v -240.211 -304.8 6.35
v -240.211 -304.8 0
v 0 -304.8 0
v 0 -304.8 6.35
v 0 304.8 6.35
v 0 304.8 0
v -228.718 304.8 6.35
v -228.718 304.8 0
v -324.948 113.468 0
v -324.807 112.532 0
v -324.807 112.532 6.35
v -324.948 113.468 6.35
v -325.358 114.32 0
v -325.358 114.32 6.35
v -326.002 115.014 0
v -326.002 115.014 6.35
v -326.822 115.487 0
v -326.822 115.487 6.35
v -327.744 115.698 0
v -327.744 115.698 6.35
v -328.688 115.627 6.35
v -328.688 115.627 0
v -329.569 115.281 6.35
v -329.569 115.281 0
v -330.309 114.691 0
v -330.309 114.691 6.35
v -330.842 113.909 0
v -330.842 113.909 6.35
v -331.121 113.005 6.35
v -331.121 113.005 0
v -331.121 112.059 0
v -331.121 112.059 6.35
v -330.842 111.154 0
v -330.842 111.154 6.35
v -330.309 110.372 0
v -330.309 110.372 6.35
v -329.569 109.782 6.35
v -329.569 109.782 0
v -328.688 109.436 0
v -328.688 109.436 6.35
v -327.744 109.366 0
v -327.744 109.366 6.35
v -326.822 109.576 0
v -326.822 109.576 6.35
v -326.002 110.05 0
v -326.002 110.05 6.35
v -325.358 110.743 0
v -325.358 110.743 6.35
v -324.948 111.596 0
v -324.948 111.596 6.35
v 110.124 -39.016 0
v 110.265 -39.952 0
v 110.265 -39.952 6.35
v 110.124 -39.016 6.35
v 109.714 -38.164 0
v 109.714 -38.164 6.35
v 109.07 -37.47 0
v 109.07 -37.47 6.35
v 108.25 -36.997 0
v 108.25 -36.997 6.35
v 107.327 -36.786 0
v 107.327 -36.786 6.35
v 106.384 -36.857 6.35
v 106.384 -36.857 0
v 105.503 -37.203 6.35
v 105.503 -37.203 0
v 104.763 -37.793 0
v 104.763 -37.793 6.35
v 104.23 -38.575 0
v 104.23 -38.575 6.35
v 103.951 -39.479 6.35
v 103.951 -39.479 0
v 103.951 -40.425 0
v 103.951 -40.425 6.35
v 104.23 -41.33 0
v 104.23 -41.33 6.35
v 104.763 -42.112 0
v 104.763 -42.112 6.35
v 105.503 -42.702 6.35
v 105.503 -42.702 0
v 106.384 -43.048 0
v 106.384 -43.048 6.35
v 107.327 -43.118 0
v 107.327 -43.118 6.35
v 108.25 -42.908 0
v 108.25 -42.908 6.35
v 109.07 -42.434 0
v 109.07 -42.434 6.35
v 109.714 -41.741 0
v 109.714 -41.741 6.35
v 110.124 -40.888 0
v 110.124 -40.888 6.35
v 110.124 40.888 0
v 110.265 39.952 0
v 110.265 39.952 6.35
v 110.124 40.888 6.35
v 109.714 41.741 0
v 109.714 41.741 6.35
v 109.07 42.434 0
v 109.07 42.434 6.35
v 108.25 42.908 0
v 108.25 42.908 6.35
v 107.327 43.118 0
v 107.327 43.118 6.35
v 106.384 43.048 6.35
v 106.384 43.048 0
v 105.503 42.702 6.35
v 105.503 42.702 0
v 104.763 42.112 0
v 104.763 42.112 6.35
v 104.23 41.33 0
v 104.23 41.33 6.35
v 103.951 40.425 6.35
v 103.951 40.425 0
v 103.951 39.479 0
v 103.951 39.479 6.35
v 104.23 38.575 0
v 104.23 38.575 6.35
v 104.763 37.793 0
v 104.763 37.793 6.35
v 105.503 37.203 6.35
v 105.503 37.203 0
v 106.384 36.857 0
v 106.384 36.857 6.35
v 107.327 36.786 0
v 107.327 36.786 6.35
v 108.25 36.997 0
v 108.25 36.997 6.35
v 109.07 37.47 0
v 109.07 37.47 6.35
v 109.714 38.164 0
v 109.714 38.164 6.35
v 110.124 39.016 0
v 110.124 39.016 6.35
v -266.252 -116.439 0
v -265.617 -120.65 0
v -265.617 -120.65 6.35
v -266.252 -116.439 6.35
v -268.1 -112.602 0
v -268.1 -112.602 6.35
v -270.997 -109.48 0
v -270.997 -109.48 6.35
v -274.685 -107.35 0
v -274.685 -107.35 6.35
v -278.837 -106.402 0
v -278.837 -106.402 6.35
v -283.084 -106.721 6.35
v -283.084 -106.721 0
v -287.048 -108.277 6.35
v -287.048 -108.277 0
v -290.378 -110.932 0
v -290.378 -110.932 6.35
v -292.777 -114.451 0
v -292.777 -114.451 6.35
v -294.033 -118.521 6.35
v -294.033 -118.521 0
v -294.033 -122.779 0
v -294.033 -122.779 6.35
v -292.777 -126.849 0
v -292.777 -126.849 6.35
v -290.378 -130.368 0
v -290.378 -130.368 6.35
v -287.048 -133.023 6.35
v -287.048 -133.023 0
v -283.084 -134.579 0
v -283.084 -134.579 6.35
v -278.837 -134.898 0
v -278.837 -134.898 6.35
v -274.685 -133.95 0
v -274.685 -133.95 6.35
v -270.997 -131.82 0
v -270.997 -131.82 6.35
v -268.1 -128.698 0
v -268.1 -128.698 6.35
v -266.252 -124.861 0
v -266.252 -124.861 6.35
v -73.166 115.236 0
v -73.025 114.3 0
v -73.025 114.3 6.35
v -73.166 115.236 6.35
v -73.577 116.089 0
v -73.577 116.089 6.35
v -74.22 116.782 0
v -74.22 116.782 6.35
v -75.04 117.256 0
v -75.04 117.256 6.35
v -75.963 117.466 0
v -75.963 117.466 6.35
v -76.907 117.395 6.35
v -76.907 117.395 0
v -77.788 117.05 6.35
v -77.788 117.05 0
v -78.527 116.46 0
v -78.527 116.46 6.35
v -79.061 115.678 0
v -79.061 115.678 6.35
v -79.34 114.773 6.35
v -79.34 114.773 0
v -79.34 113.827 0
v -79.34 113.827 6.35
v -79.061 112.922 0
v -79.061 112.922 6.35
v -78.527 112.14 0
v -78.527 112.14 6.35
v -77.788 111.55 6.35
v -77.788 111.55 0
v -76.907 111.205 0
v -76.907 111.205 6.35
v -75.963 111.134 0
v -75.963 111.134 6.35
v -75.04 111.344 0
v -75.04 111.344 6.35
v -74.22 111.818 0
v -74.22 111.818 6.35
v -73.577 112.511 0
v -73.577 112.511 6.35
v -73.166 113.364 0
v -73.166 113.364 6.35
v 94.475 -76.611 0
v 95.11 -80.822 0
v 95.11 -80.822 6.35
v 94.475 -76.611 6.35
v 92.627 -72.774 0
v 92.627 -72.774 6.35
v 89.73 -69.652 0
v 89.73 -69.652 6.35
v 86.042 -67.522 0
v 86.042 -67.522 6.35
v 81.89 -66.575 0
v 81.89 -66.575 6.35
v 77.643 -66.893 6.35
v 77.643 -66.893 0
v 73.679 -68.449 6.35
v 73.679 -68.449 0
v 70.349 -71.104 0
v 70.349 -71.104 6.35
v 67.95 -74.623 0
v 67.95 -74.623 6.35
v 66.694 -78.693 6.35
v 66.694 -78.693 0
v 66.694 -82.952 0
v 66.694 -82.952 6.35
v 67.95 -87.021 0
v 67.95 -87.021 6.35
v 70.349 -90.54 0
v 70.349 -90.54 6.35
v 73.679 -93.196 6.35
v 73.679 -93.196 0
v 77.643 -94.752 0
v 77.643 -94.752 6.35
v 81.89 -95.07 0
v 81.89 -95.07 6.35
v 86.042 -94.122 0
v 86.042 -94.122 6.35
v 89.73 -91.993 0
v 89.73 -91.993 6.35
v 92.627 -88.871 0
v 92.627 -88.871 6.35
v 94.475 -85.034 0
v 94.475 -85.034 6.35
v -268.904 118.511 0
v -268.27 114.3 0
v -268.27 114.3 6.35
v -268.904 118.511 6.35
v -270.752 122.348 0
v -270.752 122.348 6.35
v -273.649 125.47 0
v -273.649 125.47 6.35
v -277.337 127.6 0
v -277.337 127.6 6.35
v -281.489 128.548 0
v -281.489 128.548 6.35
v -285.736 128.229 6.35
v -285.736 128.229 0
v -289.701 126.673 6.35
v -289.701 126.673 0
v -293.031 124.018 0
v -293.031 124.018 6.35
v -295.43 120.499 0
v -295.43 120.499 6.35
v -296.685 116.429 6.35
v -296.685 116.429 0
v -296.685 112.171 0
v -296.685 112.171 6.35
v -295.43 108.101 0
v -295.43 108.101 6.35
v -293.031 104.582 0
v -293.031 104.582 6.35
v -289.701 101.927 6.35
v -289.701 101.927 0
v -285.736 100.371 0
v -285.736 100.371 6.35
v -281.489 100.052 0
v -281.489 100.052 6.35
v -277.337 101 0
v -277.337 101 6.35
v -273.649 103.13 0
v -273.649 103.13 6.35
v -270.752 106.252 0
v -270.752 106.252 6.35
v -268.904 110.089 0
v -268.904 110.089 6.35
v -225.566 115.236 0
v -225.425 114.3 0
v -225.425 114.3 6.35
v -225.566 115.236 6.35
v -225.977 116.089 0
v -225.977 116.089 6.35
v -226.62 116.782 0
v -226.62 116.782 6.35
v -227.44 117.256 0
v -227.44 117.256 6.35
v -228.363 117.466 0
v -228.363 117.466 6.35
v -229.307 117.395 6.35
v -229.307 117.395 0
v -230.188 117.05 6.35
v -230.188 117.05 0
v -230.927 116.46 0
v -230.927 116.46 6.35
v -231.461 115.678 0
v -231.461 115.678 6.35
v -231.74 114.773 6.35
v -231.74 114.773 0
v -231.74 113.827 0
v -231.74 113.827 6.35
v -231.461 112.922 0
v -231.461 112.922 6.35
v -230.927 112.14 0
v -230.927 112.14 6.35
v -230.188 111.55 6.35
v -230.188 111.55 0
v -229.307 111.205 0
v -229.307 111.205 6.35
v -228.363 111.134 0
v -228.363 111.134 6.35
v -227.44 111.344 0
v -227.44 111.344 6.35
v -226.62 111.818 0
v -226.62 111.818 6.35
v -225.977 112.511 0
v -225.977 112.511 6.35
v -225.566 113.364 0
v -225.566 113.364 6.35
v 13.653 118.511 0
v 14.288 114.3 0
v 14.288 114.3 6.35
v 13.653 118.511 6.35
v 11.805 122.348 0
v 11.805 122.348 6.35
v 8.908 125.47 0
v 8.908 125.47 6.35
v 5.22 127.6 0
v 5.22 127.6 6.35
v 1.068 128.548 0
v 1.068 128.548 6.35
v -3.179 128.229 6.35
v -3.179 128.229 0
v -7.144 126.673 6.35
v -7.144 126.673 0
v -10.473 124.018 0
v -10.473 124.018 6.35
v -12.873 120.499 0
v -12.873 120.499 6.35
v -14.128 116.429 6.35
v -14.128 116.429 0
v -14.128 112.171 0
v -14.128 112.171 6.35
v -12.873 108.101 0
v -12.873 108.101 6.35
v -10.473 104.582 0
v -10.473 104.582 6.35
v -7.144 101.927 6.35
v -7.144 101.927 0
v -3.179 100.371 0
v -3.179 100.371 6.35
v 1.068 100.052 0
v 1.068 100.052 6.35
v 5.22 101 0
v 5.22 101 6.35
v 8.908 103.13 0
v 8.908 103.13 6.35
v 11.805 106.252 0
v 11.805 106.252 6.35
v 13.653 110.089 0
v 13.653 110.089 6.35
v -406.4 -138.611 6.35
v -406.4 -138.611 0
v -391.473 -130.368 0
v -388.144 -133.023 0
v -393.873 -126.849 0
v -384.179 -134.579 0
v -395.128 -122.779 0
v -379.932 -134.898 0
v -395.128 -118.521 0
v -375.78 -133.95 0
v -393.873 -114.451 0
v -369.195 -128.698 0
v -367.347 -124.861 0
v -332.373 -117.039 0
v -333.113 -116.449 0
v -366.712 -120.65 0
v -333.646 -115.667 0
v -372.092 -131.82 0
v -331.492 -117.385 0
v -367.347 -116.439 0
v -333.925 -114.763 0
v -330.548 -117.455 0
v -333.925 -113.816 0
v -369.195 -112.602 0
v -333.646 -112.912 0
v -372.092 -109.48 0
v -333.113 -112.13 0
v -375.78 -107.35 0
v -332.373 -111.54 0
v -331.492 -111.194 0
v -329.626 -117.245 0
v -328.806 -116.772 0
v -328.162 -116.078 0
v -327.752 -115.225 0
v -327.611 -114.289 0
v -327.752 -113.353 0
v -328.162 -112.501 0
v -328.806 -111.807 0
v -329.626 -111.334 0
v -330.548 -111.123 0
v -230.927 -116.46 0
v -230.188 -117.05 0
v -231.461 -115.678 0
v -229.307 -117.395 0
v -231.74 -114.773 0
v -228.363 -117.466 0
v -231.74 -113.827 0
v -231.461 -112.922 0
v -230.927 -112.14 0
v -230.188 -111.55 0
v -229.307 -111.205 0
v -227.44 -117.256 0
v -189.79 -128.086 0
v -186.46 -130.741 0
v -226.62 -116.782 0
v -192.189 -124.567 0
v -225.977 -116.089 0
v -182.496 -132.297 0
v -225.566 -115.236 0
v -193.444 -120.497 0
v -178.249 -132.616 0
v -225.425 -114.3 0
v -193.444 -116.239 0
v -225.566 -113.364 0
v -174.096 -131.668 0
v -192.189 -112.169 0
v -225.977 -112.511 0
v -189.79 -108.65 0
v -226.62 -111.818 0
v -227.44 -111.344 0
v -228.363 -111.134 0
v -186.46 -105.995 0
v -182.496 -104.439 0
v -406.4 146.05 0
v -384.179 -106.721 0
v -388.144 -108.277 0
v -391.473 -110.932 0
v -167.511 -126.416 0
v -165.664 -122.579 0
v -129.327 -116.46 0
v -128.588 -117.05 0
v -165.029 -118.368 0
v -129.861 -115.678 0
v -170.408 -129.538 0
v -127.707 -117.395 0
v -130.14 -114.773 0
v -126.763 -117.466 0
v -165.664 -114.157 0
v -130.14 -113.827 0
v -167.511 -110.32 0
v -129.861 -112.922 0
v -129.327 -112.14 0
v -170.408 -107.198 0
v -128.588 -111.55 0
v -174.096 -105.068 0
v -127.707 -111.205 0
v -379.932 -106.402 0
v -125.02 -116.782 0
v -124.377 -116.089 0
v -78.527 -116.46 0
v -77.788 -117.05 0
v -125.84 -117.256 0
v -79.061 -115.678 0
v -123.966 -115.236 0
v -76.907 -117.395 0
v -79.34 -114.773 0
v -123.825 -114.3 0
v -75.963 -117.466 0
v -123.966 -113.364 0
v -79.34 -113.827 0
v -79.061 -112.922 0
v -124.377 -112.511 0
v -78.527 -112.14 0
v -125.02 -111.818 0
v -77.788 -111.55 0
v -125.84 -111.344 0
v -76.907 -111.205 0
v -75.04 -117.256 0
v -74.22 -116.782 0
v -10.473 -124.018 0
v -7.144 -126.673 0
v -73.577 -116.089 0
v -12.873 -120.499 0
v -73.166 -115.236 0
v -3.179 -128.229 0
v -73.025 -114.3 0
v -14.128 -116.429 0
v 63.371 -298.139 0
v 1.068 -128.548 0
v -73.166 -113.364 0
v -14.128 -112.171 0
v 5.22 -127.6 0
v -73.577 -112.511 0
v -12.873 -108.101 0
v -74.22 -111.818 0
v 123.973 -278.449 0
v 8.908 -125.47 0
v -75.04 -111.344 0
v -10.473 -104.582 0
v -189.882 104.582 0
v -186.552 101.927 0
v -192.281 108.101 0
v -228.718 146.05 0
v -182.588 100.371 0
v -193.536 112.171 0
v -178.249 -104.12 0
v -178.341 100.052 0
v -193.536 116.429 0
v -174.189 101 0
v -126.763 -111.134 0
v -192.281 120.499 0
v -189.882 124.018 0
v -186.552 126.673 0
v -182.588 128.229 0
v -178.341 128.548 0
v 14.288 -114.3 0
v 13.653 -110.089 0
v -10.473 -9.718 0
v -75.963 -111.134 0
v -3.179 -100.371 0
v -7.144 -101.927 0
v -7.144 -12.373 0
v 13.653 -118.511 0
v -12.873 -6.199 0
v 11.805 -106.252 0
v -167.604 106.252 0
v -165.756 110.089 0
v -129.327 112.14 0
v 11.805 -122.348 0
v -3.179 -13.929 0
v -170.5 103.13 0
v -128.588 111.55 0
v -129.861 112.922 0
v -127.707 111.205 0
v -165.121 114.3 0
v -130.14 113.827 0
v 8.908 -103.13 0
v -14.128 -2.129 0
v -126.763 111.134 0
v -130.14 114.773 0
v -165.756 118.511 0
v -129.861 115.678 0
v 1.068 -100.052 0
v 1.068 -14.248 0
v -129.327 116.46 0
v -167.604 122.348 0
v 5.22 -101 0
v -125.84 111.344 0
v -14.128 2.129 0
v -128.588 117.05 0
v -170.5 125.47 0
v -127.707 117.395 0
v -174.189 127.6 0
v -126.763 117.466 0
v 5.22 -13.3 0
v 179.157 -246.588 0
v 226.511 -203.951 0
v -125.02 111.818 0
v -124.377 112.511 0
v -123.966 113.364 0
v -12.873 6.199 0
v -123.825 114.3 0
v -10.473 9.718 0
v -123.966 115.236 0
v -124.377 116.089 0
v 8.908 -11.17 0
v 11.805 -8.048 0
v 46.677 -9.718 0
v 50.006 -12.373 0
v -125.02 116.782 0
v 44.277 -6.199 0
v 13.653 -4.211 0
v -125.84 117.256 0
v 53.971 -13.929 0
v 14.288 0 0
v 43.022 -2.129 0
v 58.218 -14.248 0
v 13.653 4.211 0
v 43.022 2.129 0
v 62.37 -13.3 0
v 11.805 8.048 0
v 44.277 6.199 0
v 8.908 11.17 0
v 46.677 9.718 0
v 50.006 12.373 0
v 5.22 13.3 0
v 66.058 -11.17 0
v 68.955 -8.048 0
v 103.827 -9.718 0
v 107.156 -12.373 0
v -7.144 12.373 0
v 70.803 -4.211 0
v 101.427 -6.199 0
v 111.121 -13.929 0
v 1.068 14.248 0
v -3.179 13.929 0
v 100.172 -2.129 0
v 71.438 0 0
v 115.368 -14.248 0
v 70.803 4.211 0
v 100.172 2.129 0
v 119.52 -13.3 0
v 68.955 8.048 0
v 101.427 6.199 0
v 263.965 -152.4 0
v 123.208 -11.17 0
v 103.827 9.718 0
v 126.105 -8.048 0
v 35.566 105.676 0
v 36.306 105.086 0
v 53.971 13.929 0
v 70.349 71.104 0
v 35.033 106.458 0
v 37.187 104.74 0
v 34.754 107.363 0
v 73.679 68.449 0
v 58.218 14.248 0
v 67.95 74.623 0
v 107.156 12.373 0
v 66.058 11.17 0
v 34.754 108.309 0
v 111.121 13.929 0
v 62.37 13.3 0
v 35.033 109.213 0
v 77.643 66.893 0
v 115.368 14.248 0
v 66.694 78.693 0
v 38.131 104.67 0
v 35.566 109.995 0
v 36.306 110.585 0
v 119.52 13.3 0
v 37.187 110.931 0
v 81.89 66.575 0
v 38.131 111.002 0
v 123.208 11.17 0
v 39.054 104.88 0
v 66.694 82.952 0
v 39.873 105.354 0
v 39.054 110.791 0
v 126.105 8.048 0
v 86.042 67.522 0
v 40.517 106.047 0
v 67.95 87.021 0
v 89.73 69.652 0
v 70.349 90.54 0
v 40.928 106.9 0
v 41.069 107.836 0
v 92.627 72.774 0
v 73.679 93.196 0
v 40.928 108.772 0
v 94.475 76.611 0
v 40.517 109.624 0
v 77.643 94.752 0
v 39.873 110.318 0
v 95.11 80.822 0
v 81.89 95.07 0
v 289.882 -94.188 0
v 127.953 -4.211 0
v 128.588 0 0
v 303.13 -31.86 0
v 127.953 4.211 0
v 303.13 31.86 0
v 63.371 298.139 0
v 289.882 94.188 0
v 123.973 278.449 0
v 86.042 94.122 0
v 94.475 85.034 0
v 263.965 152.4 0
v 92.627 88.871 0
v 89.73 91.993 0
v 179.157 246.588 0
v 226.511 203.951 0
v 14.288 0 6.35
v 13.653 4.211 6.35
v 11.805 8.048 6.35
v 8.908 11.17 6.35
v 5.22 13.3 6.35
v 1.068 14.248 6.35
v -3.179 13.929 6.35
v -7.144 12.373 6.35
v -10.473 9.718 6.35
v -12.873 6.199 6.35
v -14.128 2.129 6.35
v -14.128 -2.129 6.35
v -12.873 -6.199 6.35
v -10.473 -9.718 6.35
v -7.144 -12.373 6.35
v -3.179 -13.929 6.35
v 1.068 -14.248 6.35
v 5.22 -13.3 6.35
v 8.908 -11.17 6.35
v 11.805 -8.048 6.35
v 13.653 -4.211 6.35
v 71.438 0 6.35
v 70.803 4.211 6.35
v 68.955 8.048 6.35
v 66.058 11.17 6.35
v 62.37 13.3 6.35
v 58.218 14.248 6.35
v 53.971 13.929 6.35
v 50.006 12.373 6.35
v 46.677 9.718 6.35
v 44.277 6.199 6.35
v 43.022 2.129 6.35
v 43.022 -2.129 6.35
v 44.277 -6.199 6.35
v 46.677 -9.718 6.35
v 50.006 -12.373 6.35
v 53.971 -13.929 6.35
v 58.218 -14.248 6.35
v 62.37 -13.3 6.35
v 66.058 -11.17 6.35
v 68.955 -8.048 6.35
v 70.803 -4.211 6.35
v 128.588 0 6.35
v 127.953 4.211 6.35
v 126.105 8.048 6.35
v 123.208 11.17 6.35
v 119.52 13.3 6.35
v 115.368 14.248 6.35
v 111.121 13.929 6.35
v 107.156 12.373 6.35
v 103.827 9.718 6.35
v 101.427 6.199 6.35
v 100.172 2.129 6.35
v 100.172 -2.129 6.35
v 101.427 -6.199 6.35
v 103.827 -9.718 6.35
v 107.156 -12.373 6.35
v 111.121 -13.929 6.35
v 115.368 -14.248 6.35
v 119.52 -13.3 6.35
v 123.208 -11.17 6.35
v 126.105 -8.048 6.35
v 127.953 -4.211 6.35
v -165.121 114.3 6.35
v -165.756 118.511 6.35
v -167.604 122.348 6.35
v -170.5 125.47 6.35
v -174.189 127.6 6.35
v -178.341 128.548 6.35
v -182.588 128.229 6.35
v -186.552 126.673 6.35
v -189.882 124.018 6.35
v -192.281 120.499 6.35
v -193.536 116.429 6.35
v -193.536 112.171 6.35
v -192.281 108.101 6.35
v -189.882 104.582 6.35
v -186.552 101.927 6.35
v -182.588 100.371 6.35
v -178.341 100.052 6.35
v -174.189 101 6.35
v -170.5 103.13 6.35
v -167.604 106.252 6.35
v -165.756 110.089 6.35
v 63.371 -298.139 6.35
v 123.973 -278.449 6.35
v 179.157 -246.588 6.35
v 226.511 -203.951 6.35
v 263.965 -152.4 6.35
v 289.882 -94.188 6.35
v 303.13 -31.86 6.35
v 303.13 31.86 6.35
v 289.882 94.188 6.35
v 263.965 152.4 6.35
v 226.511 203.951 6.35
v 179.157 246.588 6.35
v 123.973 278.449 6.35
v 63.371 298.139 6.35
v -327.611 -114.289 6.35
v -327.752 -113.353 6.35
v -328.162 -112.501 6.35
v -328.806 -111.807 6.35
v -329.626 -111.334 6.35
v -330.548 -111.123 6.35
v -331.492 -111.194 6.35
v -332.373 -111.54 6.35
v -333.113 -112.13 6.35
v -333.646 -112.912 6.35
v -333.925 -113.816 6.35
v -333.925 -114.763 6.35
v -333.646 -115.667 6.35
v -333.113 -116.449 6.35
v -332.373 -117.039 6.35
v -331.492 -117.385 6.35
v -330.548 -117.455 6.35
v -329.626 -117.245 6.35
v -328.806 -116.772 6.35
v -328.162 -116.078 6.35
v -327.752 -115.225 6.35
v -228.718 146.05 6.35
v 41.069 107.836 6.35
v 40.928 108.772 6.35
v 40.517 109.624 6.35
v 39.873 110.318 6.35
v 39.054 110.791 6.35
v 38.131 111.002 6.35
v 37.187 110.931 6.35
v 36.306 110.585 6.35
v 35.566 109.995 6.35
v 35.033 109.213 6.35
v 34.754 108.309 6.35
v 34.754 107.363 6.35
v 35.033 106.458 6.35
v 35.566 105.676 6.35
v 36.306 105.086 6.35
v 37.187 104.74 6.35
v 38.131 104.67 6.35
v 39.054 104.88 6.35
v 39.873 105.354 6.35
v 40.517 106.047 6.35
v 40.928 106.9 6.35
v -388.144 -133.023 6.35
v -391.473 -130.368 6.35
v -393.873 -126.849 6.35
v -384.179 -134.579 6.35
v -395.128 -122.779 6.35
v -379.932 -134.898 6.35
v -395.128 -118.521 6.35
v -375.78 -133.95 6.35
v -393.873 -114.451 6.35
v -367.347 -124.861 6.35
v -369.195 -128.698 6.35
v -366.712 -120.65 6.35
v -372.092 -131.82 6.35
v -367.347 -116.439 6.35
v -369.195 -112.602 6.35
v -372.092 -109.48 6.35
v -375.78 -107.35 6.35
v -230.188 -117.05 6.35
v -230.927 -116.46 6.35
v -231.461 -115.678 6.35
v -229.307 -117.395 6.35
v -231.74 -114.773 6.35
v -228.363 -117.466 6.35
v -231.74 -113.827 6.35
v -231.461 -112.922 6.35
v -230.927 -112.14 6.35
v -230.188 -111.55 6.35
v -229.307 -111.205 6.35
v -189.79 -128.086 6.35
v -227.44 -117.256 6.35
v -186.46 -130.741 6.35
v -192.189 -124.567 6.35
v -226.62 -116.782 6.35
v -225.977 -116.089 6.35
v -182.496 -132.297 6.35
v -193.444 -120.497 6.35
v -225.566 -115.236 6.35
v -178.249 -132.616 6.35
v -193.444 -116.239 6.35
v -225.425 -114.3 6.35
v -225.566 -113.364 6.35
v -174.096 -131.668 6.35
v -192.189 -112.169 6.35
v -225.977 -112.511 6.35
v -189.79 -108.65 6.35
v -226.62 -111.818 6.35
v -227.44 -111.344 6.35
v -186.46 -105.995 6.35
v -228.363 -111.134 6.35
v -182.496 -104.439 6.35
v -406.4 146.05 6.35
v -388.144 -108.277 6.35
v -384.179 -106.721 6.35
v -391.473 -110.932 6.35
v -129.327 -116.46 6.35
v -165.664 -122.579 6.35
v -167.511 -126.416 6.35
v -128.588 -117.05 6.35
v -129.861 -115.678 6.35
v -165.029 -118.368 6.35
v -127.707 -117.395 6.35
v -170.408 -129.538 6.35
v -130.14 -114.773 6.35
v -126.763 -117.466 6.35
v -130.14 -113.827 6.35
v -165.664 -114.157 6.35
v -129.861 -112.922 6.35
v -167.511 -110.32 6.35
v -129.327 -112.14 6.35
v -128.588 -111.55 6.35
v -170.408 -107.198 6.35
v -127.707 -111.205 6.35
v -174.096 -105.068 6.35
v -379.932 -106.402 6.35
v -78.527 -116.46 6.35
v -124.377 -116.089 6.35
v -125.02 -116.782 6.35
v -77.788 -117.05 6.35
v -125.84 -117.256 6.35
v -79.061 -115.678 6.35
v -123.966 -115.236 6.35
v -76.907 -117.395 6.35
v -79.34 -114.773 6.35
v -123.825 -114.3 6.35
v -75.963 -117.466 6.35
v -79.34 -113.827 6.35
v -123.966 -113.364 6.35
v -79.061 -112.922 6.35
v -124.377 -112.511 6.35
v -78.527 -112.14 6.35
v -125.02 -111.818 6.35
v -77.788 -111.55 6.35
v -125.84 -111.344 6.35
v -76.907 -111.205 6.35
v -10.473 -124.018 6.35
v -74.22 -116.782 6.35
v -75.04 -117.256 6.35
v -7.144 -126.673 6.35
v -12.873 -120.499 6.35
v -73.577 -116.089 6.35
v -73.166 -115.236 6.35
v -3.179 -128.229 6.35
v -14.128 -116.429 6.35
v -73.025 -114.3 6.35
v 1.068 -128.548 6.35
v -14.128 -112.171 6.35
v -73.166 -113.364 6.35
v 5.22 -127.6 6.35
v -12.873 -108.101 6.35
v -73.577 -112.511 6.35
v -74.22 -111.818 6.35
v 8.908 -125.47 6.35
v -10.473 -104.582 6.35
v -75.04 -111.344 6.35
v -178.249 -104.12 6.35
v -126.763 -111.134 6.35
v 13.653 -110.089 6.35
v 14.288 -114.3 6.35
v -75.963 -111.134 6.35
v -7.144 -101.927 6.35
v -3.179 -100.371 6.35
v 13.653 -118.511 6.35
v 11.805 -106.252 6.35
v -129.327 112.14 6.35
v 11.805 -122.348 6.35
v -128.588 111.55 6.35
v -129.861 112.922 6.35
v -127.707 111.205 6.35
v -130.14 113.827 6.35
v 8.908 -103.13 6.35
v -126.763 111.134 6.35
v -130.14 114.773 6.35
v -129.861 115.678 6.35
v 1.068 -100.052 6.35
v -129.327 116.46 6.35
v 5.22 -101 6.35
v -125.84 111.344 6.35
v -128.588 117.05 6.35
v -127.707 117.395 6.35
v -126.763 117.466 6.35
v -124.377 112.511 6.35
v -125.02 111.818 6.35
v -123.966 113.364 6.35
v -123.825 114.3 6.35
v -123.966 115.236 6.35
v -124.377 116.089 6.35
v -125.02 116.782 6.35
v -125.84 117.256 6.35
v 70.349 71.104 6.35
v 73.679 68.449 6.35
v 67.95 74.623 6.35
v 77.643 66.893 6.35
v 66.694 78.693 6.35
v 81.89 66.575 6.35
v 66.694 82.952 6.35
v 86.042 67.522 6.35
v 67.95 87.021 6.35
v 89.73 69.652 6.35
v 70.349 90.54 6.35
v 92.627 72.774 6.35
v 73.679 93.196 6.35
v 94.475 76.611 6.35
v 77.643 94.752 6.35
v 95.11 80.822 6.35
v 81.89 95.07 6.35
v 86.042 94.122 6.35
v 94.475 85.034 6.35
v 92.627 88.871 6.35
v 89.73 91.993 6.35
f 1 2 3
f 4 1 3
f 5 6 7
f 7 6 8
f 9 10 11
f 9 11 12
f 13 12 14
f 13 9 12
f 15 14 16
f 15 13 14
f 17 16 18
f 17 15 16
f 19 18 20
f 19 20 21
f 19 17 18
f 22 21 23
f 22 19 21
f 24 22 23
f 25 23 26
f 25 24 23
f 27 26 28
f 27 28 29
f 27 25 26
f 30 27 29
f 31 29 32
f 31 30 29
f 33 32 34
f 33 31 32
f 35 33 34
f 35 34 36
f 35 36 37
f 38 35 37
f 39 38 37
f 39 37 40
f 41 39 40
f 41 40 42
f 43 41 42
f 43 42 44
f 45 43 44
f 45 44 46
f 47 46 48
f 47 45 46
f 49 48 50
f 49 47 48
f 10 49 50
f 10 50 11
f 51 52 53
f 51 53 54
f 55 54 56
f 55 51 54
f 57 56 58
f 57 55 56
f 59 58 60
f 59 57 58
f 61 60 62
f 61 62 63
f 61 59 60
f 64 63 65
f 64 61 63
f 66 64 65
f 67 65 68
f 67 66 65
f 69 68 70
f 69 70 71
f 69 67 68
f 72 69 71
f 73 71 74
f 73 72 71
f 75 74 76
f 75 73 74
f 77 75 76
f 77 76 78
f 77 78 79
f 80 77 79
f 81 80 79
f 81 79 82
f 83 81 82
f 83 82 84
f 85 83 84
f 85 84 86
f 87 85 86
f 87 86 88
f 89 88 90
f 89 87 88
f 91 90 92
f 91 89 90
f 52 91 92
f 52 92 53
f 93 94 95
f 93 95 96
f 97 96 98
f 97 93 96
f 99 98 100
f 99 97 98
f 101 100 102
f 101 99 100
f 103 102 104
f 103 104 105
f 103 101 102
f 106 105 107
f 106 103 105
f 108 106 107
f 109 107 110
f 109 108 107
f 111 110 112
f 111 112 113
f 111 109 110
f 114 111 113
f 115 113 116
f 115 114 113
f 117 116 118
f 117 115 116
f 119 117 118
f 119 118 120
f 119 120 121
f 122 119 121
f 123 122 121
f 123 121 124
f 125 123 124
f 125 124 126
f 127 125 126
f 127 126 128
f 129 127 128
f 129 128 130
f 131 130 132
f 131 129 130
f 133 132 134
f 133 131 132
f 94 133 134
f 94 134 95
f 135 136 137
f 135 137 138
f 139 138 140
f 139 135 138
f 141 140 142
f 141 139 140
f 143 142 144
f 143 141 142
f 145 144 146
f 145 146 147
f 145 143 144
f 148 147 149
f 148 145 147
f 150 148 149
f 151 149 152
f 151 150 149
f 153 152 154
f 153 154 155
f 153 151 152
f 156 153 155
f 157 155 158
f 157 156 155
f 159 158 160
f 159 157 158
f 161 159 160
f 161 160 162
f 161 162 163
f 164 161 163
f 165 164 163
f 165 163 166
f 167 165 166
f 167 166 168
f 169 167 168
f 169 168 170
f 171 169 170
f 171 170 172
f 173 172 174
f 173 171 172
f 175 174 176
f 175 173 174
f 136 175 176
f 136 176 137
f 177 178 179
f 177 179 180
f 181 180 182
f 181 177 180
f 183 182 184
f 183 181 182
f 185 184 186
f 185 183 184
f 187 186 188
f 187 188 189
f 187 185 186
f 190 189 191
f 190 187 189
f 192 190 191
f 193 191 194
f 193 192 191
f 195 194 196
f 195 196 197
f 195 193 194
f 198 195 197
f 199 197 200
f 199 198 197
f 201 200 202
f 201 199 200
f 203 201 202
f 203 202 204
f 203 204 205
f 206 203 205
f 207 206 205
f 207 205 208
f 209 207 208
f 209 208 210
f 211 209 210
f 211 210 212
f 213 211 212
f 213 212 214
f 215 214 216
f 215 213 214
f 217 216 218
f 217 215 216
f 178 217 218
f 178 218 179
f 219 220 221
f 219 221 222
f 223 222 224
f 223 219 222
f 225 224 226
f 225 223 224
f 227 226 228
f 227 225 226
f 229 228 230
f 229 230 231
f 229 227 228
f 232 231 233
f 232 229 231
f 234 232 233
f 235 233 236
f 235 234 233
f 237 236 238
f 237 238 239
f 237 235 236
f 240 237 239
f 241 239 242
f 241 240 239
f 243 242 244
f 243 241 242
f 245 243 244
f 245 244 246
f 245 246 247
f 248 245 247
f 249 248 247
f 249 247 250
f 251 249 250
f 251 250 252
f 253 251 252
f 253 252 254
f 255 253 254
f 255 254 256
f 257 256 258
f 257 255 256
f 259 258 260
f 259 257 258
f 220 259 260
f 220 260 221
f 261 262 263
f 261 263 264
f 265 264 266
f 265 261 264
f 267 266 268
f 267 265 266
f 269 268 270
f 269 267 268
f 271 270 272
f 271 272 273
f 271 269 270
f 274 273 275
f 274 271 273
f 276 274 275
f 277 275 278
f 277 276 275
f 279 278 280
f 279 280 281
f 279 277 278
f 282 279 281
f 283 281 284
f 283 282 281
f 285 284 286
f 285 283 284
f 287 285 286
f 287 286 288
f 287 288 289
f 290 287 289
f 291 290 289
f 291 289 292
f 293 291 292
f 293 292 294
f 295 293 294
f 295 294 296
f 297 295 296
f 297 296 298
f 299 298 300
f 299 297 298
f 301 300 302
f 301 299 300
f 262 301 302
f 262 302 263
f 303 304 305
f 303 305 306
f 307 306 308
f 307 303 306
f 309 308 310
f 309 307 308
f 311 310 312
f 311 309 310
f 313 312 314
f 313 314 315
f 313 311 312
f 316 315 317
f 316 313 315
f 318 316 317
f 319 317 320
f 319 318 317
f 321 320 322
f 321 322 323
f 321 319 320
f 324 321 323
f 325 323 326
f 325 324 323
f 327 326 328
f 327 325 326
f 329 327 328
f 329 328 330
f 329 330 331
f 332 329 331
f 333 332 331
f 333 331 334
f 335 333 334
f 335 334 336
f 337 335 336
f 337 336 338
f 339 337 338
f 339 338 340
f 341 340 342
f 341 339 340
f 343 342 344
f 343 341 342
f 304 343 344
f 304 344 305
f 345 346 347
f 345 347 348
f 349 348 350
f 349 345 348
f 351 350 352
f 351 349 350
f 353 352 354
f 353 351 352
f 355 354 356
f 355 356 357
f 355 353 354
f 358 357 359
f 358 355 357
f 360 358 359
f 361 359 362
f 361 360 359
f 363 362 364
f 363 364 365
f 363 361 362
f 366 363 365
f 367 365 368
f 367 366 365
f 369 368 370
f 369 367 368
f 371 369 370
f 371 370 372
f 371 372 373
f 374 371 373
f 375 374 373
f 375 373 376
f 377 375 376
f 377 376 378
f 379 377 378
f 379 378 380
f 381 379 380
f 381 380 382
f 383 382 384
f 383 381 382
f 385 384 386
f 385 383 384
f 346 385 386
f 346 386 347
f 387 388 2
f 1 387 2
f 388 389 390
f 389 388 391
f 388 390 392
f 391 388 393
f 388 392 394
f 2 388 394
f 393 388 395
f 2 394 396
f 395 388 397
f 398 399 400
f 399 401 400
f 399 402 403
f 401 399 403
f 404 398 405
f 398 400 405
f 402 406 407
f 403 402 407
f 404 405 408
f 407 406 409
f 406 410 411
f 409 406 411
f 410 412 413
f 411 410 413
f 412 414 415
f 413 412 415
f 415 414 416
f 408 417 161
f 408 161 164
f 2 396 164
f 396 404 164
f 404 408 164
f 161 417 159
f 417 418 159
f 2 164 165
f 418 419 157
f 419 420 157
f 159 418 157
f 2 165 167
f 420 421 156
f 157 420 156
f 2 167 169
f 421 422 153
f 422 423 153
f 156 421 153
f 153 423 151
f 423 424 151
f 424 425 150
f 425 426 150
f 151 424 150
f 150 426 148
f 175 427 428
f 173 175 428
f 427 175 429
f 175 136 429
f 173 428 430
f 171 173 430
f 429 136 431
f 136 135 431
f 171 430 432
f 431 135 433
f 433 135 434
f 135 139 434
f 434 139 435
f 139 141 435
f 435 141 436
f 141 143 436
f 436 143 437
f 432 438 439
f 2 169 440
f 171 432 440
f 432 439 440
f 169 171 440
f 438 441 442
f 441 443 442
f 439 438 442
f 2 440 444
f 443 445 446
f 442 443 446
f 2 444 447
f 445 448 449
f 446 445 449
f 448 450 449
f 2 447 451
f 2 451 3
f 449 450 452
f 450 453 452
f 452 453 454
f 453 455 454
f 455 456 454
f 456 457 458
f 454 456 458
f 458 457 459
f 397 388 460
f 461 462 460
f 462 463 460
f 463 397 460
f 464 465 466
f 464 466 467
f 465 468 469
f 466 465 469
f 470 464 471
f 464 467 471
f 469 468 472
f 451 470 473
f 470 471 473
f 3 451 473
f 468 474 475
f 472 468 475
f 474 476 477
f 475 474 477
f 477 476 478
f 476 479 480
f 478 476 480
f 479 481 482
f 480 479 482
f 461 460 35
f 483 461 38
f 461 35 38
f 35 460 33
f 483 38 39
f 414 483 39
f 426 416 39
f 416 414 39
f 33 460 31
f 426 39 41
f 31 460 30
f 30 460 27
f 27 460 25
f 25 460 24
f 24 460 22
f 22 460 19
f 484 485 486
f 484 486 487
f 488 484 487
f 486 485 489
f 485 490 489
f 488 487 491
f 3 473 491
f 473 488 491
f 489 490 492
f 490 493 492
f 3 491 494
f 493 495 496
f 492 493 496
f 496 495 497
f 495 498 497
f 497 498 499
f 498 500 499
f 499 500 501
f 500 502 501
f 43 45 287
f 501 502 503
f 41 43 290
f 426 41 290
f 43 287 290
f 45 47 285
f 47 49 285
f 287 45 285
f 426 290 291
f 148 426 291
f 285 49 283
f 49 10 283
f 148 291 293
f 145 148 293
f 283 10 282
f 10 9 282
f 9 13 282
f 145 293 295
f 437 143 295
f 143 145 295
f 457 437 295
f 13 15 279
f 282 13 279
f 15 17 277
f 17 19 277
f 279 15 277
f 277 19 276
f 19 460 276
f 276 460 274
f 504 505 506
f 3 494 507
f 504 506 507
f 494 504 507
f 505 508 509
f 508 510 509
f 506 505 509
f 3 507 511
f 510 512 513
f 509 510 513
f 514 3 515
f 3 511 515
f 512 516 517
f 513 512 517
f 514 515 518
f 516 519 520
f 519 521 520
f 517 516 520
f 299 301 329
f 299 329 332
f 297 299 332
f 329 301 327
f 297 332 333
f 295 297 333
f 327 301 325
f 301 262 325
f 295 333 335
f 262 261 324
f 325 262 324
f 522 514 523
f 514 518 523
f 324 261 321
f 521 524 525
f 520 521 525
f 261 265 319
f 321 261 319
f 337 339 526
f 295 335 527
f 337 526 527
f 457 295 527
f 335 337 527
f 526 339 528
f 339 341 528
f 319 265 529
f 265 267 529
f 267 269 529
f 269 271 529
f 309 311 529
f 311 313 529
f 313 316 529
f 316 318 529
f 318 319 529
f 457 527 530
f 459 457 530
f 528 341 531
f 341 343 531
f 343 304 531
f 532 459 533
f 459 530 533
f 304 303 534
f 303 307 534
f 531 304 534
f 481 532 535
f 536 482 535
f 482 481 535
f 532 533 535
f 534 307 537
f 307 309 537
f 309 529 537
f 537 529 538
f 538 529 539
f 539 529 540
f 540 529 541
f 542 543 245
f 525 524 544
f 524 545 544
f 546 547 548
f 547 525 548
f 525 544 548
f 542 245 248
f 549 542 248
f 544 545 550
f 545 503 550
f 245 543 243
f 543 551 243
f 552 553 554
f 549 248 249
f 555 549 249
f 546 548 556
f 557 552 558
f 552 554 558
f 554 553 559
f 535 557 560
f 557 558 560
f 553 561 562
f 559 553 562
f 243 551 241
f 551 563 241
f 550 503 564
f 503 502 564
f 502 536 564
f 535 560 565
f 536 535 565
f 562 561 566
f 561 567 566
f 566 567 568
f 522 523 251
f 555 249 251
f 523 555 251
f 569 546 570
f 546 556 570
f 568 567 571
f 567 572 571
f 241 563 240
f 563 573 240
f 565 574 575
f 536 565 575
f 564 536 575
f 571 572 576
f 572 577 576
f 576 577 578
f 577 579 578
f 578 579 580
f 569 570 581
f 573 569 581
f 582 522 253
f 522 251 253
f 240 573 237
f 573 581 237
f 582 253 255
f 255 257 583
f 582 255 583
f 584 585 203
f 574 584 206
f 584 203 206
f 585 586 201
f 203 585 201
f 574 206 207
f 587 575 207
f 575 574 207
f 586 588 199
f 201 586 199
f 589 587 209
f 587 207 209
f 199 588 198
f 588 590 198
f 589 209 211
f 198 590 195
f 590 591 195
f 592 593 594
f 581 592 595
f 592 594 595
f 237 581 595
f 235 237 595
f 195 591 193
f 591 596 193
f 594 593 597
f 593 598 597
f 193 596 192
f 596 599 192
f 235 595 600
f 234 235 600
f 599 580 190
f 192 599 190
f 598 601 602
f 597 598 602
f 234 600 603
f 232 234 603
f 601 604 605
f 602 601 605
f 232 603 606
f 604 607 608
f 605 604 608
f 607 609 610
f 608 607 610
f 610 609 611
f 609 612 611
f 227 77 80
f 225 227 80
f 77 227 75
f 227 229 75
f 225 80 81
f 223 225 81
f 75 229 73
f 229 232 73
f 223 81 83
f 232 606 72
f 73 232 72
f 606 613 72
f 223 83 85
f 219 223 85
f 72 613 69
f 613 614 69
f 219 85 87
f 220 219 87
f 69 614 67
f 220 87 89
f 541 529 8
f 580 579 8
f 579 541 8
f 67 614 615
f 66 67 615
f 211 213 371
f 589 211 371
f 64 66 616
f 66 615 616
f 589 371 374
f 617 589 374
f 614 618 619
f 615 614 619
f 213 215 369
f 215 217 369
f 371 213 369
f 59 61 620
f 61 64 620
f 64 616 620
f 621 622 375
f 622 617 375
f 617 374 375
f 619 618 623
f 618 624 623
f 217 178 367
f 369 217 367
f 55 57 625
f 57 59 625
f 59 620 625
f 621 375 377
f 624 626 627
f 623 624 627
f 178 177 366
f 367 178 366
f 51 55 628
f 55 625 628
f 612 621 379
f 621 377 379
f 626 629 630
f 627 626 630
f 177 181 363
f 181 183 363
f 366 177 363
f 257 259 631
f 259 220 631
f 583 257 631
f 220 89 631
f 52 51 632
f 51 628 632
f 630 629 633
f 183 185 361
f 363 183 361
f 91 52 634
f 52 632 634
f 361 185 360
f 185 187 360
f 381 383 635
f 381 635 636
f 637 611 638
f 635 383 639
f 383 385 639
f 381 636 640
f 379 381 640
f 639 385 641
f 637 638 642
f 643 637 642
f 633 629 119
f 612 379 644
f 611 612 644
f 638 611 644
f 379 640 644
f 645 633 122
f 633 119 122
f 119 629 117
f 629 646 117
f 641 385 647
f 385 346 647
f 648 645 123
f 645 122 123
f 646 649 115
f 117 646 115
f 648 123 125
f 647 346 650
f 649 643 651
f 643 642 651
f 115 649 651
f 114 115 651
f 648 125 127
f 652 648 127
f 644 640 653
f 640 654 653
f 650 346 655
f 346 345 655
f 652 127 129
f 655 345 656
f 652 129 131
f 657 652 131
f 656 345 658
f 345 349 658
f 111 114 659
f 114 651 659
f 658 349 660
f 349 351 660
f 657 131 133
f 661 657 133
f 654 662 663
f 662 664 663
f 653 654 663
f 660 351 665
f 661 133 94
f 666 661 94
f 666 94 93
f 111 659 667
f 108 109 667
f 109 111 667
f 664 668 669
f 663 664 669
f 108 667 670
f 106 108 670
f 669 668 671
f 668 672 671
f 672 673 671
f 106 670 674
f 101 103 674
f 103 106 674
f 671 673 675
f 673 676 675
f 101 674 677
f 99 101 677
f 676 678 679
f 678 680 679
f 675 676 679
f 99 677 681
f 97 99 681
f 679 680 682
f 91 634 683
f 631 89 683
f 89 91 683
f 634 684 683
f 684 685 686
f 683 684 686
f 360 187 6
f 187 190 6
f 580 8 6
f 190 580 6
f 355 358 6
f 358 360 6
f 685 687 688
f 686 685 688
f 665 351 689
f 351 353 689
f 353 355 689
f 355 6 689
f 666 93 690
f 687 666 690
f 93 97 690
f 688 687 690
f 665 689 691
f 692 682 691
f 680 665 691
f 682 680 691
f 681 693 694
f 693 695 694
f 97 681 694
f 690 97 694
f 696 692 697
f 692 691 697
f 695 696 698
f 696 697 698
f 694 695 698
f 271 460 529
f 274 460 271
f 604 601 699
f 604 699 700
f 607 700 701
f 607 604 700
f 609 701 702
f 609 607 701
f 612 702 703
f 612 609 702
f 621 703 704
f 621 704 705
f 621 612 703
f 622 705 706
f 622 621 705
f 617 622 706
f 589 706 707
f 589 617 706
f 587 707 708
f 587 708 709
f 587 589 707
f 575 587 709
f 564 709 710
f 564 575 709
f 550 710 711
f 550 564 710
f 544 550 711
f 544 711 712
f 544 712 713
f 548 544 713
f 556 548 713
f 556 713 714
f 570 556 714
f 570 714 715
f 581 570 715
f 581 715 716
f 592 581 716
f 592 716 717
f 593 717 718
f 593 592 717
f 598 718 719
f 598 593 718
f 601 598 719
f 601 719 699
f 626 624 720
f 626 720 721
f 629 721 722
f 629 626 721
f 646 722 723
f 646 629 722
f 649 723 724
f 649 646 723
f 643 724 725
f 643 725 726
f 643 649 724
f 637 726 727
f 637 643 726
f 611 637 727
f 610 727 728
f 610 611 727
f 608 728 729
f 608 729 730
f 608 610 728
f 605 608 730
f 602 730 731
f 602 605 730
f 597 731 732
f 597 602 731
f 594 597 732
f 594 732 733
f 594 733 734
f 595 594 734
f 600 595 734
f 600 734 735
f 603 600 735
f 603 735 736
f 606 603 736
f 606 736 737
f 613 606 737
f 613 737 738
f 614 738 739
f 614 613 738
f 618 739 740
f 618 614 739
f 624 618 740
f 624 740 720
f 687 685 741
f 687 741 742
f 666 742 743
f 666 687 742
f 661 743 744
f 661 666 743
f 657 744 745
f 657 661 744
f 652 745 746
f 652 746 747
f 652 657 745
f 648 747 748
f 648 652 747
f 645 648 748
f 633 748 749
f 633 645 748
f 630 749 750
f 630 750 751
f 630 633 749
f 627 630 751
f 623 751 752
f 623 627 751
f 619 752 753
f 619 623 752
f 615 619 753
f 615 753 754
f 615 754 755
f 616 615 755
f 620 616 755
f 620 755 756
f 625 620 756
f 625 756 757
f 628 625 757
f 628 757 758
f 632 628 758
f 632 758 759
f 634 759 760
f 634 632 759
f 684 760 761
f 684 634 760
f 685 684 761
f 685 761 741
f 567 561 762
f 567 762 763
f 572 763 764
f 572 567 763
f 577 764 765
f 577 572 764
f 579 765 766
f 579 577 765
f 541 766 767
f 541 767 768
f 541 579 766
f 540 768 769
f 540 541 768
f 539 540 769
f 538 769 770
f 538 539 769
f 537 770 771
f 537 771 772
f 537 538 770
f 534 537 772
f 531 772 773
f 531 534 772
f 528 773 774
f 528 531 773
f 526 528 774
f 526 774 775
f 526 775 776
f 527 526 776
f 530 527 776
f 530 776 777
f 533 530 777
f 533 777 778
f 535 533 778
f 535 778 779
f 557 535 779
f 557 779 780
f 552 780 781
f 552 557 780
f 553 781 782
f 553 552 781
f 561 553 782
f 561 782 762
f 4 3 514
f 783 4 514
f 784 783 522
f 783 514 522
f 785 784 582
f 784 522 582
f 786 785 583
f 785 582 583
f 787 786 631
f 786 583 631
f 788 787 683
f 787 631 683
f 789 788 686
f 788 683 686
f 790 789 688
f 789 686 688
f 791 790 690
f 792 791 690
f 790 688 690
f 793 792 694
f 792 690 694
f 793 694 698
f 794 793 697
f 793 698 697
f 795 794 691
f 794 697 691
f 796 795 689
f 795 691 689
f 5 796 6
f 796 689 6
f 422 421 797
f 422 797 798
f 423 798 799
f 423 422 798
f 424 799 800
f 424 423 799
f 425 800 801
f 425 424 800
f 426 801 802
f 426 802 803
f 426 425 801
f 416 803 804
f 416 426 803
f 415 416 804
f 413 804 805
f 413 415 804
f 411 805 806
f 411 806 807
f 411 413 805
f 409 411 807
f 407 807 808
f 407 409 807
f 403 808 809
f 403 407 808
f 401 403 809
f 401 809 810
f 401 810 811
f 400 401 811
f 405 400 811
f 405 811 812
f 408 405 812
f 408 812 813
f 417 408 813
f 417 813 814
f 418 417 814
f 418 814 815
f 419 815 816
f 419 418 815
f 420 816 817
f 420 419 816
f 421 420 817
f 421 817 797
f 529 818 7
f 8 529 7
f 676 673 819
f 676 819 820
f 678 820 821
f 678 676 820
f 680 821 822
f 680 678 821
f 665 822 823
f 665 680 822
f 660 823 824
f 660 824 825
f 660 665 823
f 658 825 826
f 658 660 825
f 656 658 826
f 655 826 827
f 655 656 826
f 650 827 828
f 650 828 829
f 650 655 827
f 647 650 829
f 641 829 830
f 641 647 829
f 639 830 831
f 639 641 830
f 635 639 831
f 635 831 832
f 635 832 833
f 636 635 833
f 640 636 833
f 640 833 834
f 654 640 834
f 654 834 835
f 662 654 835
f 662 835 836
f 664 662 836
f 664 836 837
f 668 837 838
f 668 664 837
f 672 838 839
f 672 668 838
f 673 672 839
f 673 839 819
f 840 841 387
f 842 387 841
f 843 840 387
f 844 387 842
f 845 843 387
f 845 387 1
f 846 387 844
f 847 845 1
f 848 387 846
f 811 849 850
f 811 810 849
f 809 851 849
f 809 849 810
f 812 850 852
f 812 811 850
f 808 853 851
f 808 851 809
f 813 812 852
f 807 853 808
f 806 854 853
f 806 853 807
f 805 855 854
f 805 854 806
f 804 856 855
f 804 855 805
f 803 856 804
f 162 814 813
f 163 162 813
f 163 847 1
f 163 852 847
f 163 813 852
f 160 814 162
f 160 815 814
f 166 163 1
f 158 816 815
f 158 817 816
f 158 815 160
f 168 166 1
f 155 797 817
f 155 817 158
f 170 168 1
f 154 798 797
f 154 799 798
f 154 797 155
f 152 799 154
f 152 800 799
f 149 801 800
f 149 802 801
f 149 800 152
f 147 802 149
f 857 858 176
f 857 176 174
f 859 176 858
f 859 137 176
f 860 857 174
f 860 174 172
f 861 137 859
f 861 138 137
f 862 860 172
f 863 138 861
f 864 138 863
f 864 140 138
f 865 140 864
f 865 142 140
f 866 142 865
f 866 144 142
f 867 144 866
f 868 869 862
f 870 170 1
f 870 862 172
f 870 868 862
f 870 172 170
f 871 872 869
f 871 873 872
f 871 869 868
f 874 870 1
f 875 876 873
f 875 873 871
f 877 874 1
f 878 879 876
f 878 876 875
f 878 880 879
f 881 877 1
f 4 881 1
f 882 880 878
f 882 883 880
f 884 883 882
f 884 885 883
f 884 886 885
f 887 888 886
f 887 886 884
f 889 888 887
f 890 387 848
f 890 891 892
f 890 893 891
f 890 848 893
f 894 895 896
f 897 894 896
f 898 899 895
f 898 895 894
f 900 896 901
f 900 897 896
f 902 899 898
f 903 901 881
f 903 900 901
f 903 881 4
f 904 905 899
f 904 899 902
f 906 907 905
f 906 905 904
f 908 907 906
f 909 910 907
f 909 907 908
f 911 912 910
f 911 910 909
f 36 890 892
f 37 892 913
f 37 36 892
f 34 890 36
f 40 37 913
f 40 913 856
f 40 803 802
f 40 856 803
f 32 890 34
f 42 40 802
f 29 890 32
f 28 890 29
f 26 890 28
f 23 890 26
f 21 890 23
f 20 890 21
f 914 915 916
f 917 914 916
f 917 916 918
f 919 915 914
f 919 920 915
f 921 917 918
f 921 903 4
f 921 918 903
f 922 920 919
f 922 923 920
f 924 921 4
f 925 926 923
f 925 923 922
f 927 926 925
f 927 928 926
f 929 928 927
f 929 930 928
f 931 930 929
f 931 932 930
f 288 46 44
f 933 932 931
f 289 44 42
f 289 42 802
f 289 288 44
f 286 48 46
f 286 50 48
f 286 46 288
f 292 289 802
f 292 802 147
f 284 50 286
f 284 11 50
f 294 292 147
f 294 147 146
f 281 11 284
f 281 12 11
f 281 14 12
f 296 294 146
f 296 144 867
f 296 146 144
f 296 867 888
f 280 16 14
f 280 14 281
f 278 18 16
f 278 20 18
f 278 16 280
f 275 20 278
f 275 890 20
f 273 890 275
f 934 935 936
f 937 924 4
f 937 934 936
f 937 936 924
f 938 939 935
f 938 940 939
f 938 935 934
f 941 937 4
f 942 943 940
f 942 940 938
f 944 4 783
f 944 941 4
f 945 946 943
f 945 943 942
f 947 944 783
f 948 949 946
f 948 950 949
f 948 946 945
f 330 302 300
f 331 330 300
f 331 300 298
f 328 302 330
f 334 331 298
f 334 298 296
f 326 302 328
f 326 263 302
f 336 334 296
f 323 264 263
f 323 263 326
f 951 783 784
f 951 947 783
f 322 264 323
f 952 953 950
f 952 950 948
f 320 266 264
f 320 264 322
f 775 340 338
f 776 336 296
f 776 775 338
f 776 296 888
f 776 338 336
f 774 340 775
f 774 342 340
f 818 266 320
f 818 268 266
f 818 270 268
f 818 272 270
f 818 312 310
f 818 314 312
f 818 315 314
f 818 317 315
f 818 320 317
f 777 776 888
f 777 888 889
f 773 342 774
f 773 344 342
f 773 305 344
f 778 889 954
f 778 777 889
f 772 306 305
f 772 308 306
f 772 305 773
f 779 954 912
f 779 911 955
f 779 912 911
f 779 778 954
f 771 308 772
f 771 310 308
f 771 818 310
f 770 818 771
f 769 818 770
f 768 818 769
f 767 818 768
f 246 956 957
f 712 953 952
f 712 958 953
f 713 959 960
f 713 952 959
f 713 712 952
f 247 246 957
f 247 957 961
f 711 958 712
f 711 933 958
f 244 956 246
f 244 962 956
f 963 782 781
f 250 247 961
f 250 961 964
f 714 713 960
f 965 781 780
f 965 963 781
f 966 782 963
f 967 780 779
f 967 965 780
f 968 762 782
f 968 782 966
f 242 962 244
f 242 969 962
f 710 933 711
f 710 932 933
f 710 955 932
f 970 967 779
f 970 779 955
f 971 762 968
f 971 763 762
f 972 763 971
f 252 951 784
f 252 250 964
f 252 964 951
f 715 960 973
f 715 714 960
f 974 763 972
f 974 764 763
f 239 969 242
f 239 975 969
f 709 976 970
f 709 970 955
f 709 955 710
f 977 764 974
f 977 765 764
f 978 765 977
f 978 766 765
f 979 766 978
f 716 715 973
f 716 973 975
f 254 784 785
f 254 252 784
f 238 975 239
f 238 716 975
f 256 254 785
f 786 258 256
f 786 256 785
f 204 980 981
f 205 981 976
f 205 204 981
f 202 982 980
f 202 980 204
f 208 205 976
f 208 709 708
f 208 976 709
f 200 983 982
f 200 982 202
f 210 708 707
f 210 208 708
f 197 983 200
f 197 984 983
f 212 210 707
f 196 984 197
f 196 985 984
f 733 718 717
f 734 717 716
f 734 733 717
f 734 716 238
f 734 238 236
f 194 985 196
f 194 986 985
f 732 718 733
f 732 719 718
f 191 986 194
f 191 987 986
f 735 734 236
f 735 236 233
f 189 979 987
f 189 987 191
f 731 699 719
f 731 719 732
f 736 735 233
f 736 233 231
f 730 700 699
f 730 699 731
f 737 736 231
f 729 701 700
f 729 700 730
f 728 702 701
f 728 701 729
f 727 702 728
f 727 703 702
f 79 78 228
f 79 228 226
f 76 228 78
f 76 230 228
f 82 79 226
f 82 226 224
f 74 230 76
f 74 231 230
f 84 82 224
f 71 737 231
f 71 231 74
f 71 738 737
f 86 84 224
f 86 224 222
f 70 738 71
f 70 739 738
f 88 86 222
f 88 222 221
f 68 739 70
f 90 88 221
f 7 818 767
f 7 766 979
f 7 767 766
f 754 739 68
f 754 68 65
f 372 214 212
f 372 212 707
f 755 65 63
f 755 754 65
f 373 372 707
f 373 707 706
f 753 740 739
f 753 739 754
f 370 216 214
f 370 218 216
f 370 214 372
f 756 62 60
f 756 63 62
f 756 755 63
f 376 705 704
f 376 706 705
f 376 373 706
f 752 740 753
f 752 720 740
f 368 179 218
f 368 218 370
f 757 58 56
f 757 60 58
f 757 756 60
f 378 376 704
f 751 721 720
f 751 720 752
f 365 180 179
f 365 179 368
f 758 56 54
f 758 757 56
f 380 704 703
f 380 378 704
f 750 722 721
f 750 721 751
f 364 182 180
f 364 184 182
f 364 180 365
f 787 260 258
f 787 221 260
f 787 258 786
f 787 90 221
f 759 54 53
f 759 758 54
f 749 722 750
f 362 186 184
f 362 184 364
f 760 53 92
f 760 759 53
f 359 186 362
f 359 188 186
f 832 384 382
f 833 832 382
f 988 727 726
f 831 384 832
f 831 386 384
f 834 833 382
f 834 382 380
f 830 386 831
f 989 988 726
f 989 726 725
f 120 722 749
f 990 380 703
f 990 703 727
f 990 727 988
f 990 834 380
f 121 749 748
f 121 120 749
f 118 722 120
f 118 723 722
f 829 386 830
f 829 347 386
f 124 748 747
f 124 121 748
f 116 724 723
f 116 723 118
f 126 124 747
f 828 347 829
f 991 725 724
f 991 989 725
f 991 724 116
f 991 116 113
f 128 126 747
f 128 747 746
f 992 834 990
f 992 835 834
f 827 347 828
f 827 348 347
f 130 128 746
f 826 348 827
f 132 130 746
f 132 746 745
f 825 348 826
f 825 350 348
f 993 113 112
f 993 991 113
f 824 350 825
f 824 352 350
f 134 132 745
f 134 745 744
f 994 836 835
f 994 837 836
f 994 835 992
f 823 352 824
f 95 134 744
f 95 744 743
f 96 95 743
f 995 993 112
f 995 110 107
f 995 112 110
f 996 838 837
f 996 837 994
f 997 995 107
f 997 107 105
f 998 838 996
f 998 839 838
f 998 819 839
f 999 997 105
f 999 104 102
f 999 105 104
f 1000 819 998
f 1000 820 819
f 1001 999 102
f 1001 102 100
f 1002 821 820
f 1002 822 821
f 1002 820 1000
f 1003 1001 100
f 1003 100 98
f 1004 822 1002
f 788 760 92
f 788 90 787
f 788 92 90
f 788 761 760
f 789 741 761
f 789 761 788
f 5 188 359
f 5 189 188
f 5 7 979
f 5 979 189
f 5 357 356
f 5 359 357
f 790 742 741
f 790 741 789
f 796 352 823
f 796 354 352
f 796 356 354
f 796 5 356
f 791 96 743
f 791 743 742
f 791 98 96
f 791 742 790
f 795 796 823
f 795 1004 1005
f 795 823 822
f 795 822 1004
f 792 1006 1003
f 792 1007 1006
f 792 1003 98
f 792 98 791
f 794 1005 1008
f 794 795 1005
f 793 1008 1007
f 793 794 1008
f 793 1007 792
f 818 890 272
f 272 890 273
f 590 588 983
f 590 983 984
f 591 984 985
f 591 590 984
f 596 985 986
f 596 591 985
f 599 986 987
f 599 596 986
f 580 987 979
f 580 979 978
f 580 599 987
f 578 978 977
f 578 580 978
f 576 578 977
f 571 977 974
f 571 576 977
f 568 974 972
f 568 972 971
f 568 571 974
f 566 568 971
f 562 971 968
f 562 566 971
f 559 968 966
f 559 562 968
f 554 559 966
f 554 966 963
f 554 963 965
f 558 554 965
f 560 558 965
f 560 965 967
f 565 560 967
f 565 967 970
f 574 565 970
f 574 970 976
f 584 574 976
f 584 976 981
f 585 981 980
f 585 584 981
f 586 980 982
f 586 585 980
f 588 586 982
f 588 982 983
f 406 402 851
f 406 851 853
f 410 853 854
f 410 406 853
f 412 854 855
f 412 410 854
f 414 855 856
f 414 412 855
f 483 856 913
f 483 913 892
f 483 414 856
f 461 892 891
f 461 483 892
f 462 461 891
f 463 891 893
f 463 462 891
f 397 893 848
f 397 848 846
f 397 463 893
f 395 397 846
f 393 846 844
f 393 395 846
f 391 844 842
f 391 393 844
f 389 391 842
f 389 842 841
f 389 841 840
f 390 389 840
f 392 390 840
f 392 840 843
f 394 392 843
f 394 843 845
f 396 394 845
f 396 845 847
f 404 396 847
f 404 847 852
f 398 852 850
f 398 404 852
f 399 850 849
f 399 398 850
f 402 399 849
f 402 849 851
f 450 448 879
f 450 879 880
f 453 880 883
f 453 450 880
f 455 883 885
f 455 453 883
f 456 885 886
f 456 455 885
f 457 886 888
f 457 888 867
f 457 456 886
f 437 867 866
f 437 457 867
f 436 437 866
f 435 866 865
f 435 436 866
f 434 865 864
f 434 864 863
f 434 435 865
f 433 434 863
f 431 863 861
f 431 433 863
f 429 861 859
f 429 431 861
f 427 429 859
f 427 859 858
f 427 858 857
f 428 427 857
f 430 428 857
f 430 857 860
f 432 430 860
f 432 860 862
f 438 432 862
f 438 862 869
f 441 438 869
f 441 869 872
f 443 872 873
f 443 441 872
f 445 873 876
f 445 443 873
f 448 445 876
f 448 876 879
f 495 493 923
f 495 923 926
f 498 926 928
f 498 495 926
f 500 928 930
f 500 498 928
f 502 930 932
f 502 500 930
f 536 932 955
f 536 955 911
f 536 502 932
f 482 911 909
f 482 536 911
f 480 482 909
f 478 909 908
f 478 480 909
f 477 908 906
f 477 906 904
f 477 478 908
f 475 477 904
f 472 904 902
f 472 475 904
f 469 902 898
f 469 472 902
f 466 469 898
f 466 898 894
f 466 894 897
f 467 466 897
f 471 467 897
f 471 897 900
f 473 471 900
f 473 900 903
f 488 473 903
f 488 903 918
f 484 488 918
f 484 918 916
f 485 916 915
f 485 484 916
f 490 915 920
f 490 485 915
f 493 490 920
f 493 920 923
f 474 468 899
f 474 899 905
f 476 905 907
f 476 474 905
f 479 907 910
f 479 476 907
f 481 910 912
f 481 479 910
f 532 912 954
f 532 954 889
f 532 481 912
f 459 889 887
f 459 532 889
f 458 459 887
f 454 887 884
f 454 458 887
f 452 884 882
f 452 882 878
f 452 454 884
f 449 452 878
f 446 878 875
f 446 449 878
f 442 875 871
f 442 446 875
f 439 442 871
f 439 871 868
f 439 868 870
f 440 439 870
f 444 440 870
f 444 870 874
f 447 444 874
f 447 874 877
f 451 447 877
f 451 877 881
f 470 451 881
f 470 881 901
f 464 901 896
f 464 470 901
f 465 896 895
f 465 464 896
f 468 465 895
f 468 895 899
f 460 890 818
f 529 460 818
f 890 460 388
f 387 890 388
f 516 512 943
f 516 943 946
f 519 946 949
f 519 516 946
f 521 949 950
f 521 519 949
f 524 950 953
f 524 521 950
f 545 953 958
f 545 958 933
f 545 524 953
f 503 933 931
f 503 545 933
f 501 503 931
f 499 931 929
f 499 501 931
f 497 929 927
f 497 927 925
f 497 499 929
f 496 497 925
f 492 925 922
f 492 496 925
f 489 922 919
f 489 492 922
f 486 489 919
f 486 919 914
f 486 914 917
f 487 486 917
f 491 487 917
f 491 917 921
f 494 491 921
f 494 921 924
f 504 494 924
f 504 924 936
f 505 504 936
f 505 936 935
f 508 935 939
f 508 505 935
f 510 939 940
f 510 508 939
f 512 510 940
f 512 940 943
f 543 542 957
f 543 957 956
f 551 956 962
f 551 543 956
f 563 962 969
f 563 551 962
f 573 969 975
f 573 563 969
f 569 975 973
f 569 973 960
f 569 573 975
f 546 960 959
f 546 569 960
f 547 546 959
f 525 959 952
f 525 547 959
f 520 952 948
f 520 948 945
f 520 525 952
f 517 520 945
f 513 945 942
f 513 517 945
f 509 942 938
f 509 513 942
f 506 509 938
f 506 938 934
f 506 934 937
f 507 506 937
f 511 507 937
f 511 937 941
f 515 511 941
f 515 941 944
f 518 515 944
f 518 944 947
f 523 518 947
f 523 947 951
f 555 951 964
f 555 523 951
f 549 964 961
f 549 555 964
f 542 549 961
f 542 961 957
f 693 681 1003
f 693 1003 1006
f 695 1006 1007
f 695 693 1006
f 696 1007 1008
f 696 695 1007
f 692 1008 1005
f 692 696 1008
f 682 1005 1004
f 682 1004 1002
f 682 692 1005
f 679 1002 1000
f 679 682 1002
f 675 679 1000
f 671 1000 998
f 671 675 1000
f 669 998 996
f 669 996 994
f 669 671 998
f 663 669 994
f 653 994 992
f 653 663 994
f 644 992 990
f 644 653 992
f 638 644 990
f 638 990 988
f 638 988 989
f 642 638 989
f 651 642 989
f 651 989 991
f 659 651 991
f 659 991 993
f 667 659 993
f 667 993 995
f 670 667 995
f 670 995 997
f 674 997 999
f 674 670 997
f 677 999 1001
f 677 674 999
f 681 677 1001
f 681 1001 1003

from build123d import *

# Parameters (mm, degrees)
MODEL_R             = 14.2875
MODEL_R_2           = 3.175
BOSS_EXTRUDE1_DEPTH = 6.35
SKETCH2_W           = 177.682226564
SKETCH2_H           = 158.75
CUT_EXTRUDE1_DEPTH  = 6.35


with BuildPart() as part:
    # Model → Boss-Extrude1 (new body)
    with BuildSketch(Plane.XY):
        with BuildLine():
            Line((0, 304.8), (-406.4, 304.8))
            Line((-406.4, 304.8), (-406.4, -120.65))
            Line((-406.4, -120.65), (-406.4, -138.610512242))
            Line((-406.4, -138.610512242), (-240.210512242, -304.8))
            Line((-240.210512242, -304.8), (-222.25, -304.8))
            Line((-222.25, -304.8), (0, -304.8))
            ThreePointArc((0, -304.8), (304.8, 0), (0, 304.8))
        make_face()
        with Locations((-282.557162358, 114.3)):
            Circle(MODEL_R, mode=Mode.SUBTRACT)
        with Locations((-179.408571771, 114.3)):
            Circle(MODEL_R, mode=Mode.SUBTRACT)
        with Locations((0, 114.3)):
            Circle(MODEL_R, mode=Mode.SUBTRACT)
        with Locations((80.82230509, 80.82230509)):
            Circle(MODEL_R, mode=Mode.SUBTRACT)
        with Locations((114.3, 0)):
            Circle(MODEL_R, mode=Mode.SUBTRACT)
        with Locations((80.82230509, -80.82230509)):
            Circle(MODEL_R, mode=Mode.SUBTRACT)
        with Locations((0, -114.3)):
            Circle(MODEL_R, mode=Mode.SUBTRACT)
        with Locations((-179.316283411, -118.368022334)):
            Circle(MODEL_R, mode=Mode.SUBTRACT)
        with Locations((-381, -120.65)):
            Circle(MODEL_R, mode=Mode.SUBTRACT)
        with Locations((-279.904657875, -120.65)):
            Circle(MODEL_R, mode=Mode.SUBTRACT)
        Circle(MODEL_R, mode=Mode.SUBTRACT)
        with Locations((57.15, 0)):
            Circle(MODEL_R, mode=Mode.SUBTRACT)
        with Locations((37.893602924, 107.835823628)):
            Circle(MODEL_R_2, mode=Mode.SUBTRACT)
        with Locations((107.090214294, 39.952171435)):
            Circle(MODEL_R_2, mode=Mode.SUBTRACT)
        with Locations((107.090214294, -39.952171435)):
            Circle(MODEL_R_2, mode=Mode.SUBTRACT)
        with Locations((-327.981609649, 112.531845238)):
            Circle(MODEL_R_2, mode=Mode.SUBTRACT)
        with Locations((-330.785746456, -114.289302148)):
            Circle(MODEL_R_2, mode=Mode.SUBTRACT)
        with Locations((-228.6, 114.3)):
            Circle(MODEL_R_2, mode=Mode.SUBTRACT)
        with Locations((-127, 114.3)):
            Circle(MODEL_R_2, mode=Mode.SUBTRACT)
        with Locations((-76.2, 114.3)):
            Circle(MODEL_R_2, mode=Mode.SUBTRACT)
        with Locations((-76.2, -114.3)):
            Circle(MODEL_R_2, mode=Mode.SUBTRACT)
        with Locations((-127, -114.3)):
            Circle(MODEL_R_2, mode=Mode.SUBTRACT)
        with Locations((-228.6, -114.3)):
            Circle(MODEL_R_2, mode=Mode.SUBTRACT)
    extrude(amount=BOSS_EXTRUDE1_DEPTH)

    # Sketch2 → Cut-Extrude1 (cut)
    with BuildSketch(Plane.XY.offset(6.35)):
        with Locations((-317.558886718, 225.425)):
            Rectangle(SKETCH2_W, SKETCH2_H)
    extrude(amount=-CUT_EXTRUDE1_DEPTH, mode=Mode.SUBTRACT)


solid = part.part
